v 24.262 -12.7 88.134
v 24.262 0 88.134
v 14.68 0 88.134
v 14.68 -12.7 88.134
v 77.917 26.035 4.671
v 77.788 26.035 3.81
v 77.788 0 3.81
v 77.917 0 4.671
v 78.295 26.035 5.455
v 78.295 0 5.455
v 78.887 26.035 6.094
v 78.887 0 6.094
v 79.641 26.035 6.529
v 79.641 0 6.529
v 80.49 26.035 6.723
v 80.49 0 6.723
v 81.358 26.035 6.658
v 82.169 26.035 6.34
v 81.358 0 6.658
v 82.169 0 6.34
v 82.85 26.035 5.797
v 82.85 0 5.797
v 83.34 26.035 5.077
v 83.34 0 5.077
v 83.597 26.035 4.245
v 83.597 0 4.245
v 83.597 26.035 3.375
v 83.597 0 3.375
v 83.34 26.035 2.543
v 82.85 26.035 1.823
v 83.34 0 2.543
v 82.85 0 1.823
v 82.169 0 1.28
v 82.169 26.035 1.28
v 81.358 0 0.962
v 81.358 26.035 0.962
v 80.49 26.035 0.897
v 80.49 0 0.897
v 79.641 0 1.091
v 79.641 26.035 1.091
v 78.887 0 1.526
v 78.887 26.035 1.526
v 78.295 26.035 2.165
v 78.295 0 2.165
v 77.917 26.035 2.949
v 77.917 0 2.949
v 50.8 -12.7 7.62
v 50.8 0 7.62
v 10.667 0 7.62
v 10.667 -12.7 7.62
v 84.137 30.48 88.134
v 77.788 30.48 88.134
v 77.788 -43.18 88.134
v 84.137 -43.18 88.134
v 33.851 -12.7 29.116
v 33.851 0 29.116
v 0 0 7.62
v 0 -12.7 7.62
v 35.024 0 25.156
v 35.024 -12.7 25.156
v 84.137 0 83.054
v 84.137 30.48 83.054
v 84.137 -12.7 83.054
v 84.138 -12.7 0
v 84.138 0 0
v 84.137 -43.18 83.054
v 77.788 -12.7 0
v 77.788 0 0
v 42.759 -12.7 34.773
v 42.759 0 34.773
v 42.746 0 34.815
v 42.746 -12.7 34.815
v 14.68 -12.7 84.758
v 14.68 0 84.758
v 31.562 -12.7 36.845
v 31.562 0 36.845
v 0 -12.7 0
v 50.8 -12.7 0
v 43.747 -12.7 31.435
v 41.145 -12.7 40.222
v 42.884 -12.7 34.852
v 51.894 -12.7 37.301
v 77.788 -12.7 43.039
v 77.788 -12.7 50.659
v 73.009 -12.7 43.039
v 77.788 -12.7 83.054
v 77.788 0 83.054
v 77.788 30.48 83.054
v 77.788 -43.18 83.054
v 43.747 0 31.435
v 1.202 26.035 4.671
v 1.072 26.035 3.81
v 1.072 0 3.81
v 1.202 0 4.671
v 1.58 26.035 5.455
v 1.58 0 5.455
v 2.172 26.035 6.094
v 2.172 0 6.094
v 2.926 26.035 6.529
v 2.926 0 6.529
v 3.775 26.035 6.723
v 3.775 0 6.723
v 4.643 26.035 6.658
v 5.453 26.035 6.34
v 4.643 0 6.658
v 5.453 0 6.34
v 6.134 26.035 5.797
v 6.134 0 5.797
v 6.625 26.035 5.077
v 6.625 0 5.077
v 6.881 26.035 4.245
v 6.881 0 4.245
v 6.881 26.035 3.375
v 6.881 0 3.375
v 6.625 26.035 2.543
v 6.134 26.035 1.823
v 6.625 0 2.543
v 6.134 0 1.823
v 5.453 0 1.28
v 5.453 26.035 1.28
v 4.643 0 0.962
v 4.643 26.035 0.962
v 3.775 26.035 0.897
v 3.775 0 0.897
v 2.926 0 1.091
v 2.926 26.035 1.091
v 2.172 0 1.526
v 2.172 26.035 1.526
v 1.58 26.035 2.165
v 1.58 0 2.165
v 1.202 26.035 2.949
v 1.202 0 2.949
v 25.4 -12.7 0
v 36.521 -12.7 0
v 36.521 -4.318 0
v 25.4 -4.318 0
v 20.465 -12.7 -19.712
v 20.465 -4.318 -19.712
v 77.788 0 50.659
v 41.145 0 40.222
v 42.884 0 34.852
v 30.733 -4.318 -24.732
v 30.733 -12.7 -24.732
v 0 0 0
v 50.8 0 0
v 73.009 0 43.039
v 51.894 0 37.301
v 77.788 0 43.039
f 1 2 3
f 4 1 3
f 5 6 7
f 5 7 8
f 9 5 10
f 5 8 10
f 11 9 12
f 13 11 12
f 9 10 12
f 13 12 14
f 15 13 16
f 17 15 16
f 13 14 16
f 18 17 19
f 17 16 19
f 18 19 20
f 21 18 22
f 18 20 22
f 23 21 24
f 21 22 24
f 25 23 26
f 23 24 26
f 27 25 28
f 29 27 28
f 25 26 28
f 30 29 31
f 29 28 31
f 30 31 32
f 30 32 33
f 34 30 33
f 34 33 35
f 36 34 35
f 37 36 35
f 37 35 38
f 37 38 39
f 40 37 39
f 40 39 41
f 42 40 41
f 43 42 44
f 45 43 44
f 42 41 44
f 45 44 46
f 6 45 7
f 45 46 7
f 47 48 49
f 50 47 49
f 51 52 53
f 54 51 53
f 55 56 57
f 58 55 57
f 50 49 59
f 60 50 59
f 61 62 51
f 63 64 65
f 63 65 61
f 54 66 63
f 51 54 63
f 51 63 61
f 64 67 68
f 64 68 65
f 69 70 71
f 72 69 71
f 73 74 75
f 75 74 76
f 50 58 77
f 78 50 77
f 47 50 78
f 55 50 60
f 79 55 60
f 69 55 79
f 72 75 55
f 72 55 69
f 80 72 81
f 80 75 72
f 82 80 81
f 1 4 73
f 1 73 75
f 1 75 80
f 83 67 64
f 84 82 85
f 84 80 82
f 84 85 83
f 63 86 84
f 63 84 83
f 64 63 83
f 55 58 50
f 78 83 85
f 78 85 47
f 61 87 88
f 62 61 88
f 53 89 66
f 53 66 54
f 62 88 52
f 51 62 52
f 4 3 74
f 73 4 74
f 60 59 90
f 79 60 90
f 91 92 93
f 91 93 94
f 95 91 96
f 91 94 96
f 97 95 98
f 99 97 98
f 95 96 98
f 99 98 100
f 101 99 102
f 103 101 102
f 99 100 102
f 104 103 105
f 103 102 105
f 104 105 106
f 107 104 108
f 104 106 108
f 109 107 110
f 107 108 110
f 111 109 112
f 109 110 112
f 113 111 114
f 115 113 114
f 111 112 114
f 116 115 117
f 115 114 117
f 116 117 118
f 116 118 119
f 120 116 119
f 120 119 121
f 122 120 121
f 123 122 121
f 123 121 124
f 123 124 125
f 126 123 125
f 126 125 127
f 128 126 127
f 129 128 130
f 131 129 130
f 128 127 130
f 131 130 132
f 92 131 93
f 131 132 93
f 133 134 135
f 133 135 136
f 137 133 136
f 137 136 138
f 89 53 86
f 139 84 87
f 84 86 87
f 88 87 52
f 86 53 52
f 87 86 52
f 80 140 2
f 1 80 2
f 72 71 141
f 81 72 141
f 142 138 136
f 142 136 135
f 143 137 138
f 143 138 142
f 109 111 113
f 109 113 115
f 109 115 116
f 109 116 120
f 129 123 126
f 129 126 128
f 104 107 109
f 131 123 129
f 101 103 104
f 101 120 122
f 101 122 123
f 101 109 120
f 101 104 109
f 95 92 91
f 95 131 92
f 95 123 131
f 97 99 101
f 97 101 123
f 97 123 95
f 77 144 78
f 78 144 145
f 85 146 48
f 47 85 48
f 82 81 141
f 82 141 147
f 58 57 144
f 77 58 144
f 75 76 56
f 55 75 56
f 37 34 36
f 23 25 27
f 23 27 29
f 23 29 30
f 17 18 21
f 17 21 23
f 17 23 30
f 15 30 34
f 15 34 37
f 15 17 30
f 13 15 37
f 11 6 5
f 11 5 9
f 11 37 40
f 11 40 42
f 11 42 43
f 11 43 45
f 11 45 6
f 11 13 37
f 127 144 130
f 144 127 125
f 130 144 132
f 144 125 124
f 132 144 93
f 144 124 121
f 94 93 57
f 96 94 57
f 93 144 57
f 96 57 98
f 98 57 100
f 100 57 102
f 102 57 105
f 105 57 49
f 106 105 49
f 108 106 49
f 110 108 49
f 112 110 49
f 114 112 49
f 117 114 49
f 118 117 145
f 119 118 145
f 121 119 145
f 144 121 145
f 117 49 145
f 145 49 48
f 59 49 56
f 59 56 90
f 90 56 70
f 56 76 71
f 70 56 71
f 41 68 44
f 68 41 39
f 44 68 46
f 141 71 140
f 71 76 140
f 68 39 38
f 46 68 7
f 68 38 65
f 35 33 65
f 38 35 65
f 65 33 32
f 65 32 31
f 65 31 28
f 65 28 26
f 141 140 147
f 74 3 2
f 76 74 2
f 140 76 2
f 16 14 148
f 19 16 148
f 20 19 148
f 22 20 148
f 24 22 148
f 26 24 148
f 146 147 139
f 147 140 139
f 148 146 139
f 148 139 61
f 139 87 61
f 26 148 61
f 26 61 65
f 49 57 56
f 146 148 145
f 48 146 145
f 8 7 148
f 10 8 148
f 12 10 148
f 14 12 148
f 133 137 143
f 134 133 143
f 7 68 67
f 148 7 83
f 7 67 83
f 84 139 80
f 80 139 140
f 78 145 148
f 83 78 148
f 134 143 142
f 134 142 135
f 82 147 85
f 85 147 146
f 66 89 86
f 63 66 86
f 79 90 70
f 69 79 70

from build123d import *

# Parameters (mm, degrees)
F1_DEPTH  = 12.7
F2_W      = 30.48
F2_H      = 5.08
F3_DEPTH  = 6.35
F4_R      = 2.921
F5_DEPTH  = 26.035
F6_W      = 6.35
F6_H      = 43.0385274347
F7_DEPTH  = 12.7
F8_R      = 2.921
F9_DEPTH  = 26.035
F11_DEPTH = 8.382


with BuildPart() as f1:
    # F0 (on Front) → F1 (new body)
    with BuildSketch(Plane.XZ):
        Polygon((0, 7.62), (0, 0), (50.8, 0), (50.8, 7.62), (40.2175062395, 7.62), (10.666927397, 7.62), align=None)
        Polygon((50.8, 7.62), (50.8, 0), (77.7875, 43.0385274347), (77.7875, 50.6585274347), (73.0093451175, 43.0385274347), align=None)
        Polygon((33.8512634864, 29.1163723458), (0, 7.62), (10.666927397, 7.62), (35.0242672791, 25.1555861695), align=None)
        Polygon((31.5623094262, 36.8452967157), (33.8512634864, 29.1163723458), (42.7585980808, 34.7727455895), (42.746111008, 34.8149096691), (41.1448412363, 34.3797866252), (41.1448412363, 40.2217866252), align=None)
        Polygon((42.7585980808, 34.7727455895), (33.8512634864, 29.1163723458), (35.0242672791, 25.1555861695), (43.7469863398, 31.4353356192), align=None)
        Polygon((51.8942351591, 37.3007866252), (73.0093451175, 43.0385274347), (77.7875, 50.6585274347), (41.1448412363, 40.2217866252), (42.746111008, 34.8149096691), (42.8840007178, 34.8523793018), align=None)
        Polygon((14.6798598787, 84.7579557661), (31.5623094262, 36.8452967157), (41.1448412363, 40.2217866252), (24.2623916888, 88.1344456756), (24.2623916888, 84.7579557661), align=None)
        Polygon((42.746111008, 34.8149096691), (41.1448412363, 40.2217866252), (41.1448412363, 34.3797866252), align=None)
        Polygon((14.6798598787, 88.1344456756), (14.6798598787, 84.7579557661), (24.2623916888, 88.1344456756), align=None)
        Polygon((24.2623916888, 88.1344456756), (14.6798598787, 84.7579557661), (24.2623916888, 84.7579557661), align=None)
    extrude(amount=F1_DEPTH)

    # F2 (on face) → F3 (join)
    with BuildSketch(Plane.YZ.offset(77.7875)):
        Polygon((-12.7, 83.0544456756), (-12.7, 43.0385274347), (0, 43.0385274347), (0, 83.0544456756), (0, 88.1344456756), (-12.7, 88.1344456756), align=None)
        with Locations((-27.94, 85.5944456756)):
            Rectangle(F2_W, F2_H)
        with Locations((15.24, 85.5944456756)):
            Rectangle(F2_W, F2_H)
    extrude(amount=F3_DEPTH)

    # F4 (on face) → F5 (join)
    with BuildSketch(Plane(origin=(0, 0, 0), x_dir=(-1, 0, 0), z_dir=(0, 1, 0))):
        with Locations((-3.9929500781, 3.81)):
            Circle(F4_R)
    extrude(amount=F5_DEPTH)

    # F6 (on face) → F7 (join, through all)
    with BuildSketch(Plane.XZ.offset(12.7)):
        with Locations((80.9625, 21.5192637174)):
            Rectangle(F6_W, F6_H)
    extrude(amount=-F7_DEPTH)

    # F8 (on face) → F9 (join)
    with BuildSketch(Plane(origin=(0, 0, 0), x_dir=(-1, 0, 0), z_dir=(0, 1, 0))):
        with Locations((-80.7085, 3.81)):
            Circle(F8_R)
    extrude(amount=F9_DEPTH)


with BuildPart() as f11:
    # F10 (on face) → F11 (new body)
    with BuildSketch(Plane.XZ.offset(12.7)):
        Polygon((30.7334636985, -24.7319647125), (36.5205114313, 0), (25.4, 0), (20.4650110093, -19.7116281332), align=None)
    extrude(amount=-F11_DEPTH)


solid = Compound([f1.part, f11.part])
